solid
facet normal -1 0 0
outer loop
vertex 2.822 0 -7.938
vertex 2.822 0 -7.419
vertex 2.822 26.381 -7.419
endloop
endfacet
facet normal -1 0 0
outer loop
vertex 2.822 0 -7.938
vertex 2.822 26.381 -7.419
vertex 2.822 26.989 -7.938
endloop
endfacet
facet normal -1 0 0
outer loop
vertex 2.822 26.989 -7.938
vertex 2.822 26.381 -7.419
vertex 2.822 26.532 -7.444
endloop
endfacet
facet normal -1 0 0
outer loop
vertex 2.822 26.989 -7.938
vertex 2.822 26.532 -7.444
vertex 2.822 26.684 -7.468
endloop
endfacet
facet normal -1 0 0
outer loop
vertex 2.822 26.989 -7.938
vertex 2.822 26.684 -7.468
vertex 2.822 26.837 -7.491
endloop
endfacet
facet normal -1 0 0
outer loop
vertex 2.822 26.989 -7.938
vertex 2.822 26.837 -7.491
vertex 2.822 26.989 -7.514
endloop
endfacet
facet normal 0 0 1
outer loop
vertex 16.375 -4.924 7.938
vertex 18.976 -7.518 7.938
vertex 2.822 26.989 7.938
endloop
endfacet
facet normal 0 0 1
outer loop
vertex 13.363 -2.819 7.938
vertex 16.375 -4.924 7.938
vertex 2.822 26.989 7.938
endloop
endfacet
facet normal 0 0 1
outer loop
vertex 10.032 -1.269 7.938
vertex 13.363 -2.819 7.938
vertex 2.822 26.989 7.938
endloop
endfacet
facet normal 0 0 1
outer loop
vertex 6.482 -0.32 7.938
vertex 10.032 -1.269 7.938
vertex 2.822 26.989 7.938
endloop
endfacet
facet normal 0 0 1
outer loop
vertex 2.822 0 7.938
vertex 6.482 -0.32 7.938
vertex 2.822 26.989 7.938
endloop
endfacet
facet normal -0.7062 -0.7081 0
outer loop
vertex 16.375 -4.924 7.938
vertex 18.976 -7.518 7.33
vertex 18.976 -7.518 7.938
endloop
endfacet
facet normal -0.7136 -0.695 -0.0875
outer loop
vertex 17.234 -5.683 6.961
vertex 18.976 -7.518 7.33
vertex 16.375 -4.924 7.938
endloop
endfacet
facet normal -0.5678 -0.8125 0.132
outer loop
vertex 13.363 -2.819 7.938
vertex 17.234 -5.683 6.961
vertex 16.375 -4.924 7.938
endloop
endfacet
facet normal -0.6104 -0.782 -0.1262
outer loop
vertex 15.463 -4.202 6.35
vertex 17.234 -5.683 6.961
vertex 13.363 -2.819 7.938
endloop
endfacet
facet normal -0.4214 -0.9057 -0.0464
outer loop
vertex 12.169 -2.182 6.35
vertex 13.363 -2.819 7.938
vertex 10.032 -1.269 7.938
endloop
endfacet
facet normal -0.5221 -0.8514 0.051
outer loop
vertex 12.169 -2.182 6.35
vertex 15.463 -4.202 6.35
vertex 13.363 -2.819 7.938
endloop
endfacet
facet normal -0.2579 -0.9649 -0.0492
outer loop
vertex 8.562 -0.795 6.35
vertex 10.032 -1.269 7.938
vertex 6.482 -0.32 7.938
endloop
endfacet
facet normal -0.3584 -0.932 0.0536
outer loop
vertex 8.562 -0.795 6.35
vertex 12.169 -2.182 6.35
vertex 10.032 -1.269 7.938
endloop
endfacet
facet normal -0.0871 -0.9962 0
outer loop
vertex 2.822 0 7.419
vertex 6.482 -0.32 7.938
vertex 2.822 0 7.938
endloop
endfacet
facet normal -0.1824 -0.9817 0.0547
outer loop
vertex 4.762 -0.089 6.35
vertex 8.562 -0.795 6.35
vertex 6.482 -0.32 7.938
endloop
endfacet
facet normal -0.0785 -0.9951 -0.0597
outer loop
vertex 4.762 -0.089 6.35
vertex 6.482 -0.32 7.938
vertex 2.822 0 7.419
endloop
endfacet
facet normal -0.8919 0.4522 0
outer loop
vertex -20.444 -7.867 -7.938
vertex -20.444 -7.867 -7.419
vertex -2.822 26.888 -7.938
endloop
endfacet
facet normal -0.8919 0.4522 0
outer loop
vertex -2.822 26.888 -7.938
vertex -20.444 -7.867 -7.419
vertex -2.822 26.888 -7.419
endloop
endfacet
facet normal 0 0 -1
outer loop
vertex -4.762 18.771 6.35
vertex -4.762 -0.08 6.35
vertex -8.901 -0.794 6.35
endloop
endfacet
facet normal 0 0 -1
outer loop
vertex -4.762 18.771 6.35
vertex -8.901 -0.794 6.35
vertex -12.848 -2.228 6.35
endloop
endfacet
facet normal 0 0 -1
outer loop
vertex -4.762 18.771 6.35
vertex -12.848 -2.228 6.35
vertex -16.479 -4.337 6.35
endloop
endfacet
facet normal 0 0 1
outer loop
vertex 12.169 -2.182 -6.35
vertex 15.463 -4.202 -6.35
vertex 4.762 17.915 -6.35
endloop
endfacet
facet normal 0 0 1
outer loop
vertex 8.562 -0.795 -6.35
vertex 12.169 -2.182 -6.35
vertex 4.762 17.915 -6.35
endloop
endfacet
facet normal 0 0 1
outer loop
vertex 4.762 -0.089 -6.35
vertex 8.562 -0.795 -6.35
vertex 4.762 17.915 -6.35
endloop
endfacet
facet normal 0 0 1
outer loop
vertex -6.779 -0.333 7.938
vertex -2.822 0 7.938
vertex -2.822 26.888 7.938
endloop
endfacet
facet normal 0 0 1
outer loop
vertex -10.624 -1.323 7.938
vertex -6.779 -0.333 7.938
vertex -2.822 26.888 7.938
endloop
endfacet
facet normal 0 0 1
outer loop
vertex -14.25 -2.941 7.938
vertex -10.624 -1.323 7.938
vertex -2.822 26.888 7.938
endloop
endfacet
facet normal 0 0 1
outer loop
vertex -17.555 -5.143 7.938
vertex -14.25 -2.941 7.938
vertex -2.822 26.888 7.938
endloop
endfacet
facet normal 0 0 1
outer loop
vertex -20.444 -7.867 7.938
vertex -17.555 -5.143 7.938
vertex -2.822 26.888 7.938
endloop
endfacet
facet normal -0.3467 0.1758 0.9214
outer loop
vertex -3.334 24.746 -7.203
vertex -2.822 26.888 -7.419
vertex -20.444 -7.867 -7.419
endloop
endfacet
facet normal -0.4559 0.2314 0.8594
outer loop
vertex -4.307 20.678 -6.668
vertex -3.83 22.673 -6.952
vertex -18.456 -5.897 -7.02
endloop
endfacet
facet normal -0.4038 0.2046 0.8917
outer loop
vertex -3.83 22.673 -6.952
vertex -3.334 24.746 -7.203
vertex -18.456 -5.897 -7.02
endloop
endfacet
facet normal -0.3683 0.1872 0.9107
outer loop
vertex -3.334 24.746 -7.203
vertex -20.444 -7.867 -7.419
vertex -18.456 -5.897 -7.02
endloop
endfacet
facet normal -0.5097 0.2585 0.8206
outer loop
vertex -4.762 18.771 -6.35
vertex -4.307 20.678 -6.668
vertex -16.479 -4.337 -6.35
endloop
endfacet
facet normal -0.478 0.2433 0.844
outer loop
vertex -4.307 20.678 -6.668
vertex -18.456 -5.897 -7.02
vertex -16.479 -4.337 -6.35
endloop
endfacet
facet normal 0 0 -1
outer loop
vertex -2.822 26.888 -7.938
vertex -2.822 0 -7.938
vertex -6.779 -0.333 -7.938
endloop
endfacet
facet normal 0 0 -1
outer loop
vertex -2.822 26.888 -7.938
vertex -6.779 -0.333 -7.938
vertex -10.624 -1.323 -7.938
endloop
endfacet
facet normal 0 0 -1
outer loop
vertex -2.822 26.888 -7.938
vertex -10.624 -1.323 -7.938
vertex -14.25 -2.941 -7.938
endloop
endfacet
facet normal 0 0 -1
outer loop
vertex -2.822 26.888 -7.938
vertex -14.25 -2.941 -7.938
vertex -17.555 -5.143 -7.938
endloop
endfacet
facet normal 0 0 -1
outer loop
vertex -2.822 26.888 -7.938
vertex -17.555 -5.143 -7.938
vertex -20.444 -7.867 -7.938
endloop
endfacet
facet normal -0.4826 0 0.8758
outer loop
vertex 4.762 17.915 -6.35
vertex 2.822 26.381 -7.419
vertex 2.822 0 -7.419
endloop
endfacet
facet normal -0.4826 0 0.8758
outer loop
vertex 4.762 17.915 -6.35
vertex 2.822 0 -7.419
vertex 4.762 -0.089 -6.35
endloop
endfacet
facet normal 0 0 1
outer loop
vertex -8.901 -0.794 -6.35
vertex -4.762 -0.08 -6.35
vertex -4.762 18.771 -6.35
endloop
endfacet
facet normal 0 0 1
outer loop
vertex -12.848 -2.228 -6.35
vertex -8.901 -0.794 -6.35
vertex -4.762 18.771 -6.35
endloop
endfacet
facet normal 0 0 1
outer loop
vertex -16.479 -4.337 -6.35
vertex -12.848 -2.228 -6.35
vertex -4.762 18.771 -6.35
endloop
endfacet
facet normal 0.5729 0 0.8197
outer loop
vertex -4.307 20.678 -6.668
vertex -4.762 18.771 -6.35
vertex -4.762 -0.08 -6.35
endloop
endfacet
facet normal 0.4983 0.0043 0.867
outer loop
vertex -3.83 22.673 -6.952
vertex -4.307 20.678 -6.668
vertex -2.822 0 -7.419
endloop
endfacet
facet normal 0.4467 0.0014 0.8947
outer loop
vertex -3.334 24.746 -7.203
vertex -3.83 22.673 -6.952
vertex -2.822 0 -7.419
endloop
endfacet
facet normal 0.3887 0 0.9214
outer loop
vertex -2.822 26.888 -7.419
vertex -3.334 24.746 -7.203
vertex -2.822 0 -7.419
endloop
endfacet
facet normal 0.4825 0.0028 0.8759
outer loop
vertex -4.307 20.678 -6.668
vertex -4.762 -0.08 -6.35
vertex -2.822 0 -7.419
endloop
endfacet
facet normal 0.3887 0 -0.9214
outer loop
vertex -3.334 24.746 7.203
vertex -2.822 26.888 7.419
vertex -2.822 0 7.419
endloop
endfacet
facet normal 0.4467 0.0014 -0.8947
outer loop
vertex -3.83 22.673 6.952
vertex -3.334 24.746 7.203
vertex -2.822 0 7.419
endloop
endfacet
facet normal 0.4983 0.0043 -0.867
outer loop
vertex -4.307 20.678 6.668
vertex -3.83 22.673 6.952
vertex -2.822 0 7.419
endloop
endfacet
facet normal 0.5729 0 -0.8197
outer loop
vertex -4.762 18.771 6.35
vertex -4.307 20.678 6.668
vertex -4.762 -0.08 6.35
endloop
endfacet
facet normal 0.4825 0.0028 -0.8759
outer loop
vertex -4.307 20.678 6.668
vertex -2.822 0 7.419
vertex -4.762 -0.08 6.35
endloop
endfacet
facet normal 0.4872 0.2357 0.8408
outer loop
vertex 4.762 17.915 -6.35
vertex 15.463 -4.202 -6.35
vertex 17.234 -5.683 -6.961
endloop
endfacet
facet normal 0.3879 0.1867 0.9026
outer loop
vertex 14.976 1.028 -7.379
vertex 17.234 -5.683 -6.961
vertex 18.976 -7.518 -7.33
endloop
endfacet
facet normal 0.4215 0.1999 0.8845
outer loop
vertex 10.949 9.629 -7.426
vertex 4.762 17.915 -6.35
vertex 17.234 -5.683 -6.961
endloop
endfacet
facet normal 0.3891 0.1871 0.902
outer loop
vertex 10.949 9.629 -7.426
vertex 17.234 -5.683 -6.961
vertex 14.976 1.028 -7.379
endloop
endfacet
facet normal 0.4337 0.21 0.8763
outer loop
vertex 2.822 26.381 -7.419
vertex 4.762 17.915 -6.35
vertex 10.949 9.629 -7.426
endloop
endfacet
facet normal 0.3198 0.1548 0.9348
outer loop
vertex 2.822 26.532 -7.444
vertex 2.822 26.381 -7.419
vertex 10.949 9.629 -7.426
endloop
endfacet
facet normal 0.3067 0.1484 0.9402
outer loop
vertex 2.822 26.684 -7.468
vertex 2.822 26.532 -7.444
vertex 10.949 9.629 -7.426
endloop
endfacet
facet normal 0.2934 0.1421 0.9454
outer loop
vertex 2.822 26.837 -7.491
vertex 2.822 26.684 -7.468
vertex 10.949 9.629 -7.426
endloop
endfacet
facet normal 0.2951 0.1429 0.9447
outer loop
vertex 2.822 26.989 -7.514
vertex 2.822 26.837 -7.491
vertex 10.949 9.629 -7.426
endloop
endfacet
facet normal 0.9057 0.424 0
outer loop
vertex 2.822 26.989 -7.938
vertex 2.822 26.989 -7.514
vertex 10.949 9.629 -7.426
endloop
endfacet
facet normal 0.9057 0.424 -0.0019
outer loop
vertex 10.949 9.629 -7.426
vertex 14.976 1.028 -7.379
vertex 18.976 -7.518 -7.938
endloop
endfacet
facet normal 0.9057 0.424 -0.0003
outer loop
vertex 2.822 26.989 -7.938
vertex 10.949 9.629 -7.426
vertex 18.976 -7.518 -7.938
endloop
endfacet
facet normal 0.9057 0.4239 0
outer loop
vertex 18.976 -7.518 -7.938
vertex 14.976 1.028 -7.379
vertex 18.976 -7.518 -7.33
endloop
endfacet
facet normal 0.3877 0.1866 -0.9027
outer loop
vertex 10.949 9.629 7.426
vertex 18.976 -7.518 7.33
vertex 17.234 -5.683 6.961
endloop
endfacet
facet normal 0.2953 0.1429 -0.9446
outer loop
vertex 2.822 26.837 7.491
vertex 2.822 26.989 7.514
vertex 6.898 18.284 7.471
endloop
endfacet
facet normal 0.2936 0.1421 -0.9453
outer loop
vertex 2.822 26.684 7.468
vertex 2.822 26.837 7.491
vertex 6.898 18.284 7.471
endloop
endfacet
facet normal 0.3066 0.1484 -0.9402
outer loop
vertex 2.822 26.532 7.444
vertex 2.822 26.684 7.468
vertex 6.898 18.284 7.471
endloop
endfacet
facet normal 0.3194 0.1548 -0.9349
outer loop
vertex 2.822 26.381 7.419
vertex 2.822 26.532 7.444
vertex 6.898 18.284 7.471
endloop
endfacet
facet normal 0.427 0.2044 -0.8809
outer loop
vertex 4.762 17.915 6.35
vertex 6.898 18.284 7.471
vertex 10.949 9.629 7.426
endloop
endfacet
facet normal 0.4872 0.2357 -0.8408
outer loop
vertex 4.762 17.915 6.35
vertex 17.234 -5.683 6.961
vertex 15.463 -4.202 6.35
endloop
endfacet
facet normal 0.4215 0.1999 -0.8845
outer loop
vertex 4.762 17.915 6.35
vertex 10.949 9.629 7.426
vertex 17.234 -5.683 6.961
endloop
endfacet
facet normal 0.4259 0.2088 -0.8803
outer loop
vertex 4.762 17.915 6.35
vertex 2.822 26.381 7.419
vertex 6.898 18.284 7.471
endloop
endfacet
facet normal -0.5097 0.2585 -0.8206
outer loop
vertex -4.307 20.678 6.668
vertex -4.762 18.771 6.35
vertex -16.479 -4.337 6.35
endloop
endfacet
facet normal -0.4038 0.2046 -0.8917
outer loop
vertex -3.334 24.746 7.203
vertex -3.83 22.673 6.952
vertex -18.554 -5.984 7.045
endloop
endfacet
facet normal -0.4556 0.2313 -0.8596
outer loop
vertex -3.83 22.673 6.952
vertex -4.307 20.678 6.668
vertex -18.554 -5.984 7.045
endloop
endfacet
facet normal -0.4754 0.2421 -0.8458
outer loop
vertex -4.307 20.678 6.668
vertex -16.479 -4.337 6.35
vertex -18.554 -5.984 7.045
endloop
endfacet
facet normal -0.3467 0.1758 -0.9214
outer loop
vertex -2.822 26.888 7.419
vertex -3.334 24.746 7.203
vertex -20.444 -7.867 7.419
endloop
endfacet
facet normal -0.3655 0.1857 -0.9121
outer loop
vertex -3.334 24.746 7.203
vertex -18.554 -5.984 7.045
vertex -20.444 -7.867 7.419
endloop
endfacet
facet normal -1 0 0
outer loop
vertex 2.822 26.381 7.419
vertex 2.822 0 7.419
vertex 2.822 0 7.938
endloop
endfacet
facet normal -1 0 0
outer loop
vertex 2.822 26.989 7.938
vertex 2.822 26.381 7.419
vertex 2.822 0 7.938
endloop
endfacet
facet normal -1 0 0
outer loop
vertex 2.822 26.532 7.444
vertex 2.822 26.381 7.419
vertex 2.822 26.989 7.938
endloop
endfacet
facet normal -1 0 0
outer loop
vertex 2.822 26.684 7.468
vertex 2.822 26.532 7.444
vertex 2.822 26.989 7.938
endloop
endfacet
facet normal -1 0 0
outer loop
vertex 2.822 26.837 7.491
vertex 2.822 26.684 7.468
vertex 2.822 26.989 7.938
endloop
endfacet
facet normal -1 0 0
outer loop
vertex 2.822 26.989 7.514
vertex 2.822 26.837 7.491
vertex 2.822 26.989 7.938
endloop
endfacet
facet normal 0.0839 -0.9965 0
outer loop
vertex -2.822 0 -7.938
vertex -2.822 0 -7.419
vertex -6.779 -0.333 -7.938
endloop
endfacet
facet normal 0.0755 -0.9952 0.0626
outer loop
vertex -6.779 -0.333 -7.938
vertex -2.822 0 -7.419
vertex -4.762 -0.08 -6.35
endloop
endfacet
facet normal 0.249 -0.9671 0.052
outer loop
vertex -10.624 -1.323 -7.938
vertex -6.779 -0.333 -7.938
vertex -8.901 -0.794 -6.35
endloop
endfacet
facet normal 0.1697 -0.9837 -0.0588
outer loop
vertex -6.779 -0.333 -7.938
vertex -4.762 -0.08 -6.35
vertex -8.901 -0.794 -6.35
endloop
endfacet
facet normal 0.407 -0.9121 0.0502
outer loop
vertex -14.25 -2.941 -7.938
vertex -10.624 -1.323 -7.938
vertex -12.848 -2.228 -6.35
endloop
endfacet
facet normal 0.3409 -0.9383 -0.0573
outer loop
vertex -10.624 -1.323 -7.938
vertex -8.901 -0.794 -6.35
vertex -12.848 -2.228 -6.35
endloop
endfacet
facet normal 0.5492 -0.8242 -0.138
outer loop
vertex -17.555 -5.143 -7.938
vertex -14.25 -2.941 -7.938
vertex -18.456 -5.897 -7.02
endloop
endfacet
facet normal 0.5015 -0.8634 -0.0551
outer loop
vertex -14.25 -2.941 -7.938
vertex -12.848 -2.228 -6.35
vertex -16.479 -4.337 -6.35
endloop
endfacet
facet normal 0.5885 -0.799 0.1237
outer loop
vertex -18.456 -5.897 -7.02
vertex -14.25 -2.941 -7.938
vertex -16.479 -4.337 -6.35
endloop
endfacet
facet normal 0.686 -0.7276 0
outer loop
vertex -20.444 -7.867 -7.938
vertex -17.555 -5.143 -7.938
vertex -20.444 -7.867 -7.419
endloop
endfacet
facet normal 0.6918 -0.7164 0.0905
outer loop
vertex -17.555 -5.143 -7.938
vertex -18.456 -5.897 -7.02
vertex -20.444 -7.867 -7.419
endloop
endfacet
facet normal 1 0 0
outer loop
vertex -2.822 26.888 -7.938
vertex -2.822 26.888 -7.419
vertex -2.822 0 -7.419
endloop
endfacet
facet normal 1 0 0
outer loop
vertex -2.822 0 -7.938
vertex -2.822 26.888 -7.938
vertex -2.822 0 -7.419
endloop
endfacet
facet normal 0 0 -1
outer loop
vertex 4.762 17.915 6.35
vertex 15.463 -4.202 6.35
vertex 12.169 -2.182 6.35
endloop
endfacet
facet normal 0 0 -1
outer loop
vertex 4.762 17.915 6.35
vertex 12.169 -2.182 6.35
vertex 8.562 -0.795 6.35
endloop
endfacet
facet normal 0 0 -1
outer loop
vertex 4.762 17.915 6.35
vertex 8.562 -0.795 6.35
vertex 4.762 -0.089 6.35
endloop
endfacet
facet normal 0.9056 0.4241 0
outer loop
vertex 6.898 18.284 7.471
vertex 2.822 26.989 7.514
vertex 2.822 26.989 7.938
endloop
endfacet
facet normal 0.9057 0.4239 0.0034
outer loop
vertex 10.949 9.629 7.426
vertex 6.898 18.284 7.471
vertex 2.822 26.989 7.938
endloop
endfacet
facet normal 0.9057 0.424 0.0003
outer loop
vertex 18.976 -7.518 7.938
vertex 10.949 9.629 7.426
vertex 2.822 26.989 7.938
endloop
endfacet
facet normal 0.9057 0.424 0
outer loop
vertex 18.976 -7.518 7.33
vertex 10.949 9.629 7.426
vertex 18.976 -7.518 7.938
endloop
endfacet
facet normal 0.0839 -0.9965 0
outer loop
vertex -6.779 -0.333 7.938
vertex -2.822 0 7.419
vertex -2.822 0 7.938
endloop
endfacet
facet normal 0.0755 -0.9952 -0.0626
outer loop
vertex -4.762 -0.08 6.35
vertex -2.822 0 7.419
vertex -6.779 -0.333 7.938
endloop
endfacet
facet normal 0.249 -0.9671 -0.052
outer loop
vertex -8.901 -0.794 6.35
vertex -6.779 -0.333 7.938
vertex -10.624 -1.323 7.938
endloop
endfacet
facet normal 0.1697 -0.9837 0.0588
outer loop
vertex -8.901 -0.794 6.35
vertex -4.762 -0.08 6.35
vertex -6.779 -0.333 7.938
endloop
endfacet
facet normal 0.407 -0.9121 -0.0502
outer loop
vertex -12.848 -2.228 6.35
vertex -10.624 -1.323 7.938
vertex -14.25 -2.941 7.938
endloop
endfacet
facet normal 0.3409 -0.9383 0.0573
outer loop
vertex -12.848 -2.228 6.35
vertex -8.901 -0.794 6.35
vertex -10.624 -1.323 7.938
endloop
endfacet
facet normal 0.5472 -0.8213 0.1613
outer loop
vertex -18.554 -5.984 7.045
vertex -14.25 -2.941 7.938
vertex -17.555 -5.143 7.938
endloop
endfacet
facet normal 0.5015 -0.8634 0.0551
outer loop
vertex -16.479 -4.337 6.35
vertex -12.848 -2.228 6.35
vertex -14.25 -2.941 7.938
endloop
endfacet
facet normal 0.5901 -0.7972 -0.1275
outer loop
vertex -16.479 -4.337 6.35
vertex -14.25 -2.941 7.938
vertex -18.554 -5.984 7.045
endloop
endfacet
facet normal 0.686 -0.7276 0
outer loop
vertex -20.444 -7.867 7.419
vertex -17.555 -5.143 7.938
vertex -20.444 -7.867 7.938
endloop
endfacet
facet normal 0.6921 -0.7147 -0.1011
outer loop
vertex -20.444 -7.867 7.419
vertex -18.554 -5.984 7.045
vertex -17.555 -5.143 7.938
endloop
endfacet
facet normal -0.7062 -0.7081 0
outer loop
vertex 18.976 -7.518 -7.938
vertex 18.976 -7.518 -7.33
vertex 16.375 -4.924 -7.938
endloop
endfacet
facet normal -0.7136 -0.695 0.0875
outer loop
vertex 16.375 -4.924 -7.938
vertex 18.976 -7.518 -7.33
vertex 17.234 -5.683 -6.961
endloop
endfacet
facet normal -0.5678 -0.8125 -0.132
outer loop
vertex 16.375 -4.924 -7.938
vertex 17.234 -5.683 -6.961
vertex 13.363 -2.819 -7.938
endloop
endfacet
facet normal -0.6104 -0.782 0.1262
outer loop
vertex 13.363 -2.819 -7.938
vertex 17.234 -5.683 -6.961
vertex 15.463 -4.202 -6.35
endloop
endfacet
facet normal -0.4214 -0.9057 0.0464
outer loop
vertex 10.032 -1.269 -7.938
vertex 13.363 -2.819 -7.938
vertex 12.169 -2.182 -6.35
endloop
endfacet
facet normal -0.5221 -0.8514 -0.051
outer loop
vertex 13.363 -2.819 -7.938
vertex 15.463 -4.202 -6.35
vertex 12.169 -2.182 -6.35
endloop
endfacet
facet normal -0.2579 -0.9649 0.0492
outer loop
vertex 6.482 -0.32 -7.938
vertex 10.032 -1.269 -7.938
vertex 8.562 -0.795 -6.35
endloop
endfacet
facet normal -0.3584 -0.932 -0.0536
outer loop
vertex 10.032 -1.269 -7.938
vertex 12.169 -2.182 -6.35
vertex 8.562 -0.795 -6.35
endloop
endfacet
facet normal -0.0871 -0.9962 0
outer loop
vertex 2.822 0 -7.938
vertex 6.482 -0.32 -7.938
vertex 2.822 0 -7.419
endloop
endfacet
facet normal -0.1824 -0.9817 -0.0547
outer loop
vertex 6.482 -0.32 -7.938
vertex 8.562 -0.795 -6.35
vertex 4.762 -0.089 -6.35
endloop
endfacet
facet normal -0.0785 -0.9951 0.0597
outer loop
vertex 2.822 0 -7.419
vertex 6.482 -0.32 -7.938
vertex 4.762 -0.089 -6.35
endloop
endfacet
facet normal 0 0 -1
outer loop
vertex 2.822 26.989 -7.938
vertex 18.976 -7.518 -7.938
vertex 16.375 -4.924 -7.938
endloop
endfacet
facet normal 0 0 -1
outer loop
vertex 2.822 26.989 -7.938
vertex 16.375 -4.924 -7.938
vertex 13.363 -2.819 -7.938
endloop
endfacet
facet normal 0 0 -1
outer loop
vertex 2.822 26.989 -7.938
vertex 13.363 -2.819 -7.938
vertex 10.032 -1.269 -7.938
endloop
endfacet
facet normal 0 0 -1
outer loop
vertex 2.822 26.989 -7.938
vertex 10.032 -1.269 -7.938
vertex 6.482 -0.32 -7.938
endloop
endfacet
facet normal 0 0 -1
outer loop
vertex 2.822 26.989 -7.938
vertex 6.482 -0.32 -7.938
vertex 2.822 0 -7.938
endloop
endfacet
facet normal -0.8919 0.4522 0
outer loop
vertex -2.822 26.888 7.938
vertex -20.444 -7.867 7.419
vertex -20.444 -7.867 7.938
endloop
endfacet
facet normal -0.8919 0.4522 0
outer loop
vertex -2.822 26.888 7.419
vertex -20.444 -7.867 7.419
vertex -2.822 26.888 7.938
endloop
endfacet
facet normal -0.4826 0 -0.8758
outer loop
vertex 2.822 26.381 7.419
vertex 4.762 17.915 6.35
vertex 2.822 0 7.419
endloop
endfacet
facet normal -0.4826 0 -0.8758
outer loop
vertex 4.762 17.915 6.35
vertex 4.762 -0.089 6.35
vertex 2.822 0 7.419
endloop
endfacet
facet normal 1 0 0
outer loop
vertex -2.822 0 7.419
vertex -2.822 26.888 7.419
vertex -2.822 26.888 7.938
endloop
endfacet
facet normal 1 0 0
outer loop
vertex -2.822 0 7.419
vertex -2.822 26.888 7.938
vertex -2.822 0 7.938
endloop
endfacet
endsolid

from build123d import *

# Parameters (mm, degrees)
BOSS_EXTRUDE1_DEPTH   = 1.5875
BOSS_EXTRUDE1_2_DEPTH = 1.5875
CUT_SWEEP1_PROFILE_R  = 7.9375
CUT_SWEEP2_START      = -23.066232356
CUT_SWEEP2_DEPTH      = 38.09827597
CUT_SWEEP3_PROFILE_R  = 7.9375


# Read off the part's stored shape, not the designer's step: Cut-Sweep2
with BuildPart() as part:
    # Sketch3 → Boss-Extrude1 (new body)
    with BuildSketch(Plane.XY.offset(6.35)):
        with BuildLine():
            Line((-20.444314967, -7.866681121), (-2.822222222, 26.887811152))
            Line((-2.822222222, 26.887811152), (-2.822222222, 0))
            ThreePointArc((-2.822222222, 0), (-12.471352035, -2.055956199), (-20.444314967, -7.866681121))
        make_face()
    extrude(amount=BOSS_EXTRUDE1_DEPTH)


with BuildPart() as body_2:
    # Sketch3 → Boss-Extrude1 2 (new body)
    with BuildSketch(Plane.XY.offset(6.35)):
        with BuildLine():
            Line((2.822222222, 0), (2.822222222, 26.989428429))
            Line((2.822222222, 26.989428429), (18.976219439, -7.518023406))
            ThreePointArc((18.976219439, -7.518023406), (11.731098442, -1.97155403), (2.822222222, 0))
        make_face()
    extrude(amount=BOSS_EXTRUDE1_2_DEPTH)


with BuildPart() as body_3:
    # Mirror1: mirrored copy
    add(body_2.part.mirror(Plane.XY))


with BuildPart() as body_4:
    # Mirror1 2: mirrored copy
    add(part.part.mirror(Plane.XY))


with BuildPart() as cut_sweep1_tool:
    # Cut-Sweep1: sweep along a path in Sketch4
    with BuildLine(Plane.XY) as cut_sweep1_path:
        Line((0, 86.299042294), (0, -191.883729254))
    # Cut-Sweep1 profile (on start of the path) → Cut-Sweep1 (sweep)
    with BuildSketch(Plane(origin=(0, 86.299042294, 0), x_dir=(-1, 0, 0), z_dir=(0, -1, 0))):
        Circle(CUT_SWEEP1_PROFILE_R)
    sweep(path=cut_sweep1_path.line)


with BuildPart() as part_1:
    add(part.part)

    # Cut-Sweep1: cut by cut_sweep1_tool
    add(cut_sweep1_tool.part, mode=Mode.SUBTRACT)


with BuildPart() as body_2_1:
    add(body_2.part)

    # Cut-Sweep1: cut by cut_sweep1_tool
    add(cut_sweep1_tool.part, mode=Mode.SUBTRACT)


with BuildPart() as body_3_1:
    add(body_3.part)

    # Cut-Sweep1: cut by cut_sweep1_tool
    add(cut_sweep1_tool.part, mode=Mode.SUBTRACT)


with BuildPart() as body_4_1:
    add(body_4.part)

    # Cut-Sweep1: cut by cut_sweep1_tool
    add(cut_sweep1_tool.part, mode=Mode.SUBTRACT)


with BuildPart() as cut_sweep2_tool:
    # Cut-Sweep2 outline → Cut-Sweep2 (new body)
    with BuildSketch(Plane(origin=(0, 0, 0), x_dir=(0.900180526385369, 0.435516957094164, 0), z_dir=(0.435516957094164, -0.900180526385369, 0)).offset(CUT_SWEEP2_START)):
        with BuildLine():
            ThreePointArc((12.089594916, -6.35), (13.146220171, -7.019287615), (14.294863229, -7.514284553))
            Line((14.294863229, -7.514284553), (16, -8.094569974))
            Line((16, -8.094569974), (16, -6.35))
            Line((16, -6.35), (12.089594916, -6.35))
        make_face()
        with BuildLine():
            Line((12.089594916, 6.35), (16, 6.35))
            Line((16, 6.35), (16, 8.094569974))
            Line((16, 8.094569974), (14.294863229, 7.514284553))
            ThreePointArc((14.294863229, 7.514284553), (13.146220171, 7.019287615), (12.089594916, 6.35))
        make_face()
    extrude(amount=CUT_SWEEP2_DEPTH)


with BuildPart() as body_2_2:
    add(body_2_1.part)

    # Cut-Sweep2: cut by cut_sweep2_tool
    add(cut_sweep2_tool.part, mode=Mode.SUBTRACT)


with BuildPart() as body_3_2:
    add(body_3_1.part)

    # Cut-Sweep2: cut by cut_sweep2_tool
    add(cut_sweep2_tool.part, mode=Mode.SUBTRACT)


with BuildPart() as cut_sweep3_tool:
    # Cut-Sweep3: sweep along a path in Sketch4<12>
    with BuildLine(Plane.XY) as cut_sweep3_path:
        Line((0, 38.694463308), (-114.172049028, -186.476953797))
    # Cut-Sweep3 profile (on start of the path) → Cut-Sweep3 (sweep)
    with BuildSketch(Plane(origin=(0, 38.694463308, 0), x_dir=(-0.8918996796843264, 0.45223330414620744, 0), z_dir=(-0.45223330414620744, -0.8918996796843264, 0))):
        Circle(CUT_SWEEP3_PROFILE_R)
    sweep(path=cut_sweep3_path.line)


with BuildPart() as part_2:
    add(part_1.part)

    # Cut-Sweep3: cut by cut_sweep3_tool
    add(cut_sweep3_tool.part, mode=Mode.SUBTRACT)


with BuildPart() as body_4_2:
    add(body_4_1.part)

    # Cut-Sweep3: cut by cut_sweep3_tool
    add(cut_sweep3_tool.part, mode=Mode.SUBTRACT)


solid = Compound([body_2_2.part, body_3_2.part, part_2.part, body_4_2.part])
